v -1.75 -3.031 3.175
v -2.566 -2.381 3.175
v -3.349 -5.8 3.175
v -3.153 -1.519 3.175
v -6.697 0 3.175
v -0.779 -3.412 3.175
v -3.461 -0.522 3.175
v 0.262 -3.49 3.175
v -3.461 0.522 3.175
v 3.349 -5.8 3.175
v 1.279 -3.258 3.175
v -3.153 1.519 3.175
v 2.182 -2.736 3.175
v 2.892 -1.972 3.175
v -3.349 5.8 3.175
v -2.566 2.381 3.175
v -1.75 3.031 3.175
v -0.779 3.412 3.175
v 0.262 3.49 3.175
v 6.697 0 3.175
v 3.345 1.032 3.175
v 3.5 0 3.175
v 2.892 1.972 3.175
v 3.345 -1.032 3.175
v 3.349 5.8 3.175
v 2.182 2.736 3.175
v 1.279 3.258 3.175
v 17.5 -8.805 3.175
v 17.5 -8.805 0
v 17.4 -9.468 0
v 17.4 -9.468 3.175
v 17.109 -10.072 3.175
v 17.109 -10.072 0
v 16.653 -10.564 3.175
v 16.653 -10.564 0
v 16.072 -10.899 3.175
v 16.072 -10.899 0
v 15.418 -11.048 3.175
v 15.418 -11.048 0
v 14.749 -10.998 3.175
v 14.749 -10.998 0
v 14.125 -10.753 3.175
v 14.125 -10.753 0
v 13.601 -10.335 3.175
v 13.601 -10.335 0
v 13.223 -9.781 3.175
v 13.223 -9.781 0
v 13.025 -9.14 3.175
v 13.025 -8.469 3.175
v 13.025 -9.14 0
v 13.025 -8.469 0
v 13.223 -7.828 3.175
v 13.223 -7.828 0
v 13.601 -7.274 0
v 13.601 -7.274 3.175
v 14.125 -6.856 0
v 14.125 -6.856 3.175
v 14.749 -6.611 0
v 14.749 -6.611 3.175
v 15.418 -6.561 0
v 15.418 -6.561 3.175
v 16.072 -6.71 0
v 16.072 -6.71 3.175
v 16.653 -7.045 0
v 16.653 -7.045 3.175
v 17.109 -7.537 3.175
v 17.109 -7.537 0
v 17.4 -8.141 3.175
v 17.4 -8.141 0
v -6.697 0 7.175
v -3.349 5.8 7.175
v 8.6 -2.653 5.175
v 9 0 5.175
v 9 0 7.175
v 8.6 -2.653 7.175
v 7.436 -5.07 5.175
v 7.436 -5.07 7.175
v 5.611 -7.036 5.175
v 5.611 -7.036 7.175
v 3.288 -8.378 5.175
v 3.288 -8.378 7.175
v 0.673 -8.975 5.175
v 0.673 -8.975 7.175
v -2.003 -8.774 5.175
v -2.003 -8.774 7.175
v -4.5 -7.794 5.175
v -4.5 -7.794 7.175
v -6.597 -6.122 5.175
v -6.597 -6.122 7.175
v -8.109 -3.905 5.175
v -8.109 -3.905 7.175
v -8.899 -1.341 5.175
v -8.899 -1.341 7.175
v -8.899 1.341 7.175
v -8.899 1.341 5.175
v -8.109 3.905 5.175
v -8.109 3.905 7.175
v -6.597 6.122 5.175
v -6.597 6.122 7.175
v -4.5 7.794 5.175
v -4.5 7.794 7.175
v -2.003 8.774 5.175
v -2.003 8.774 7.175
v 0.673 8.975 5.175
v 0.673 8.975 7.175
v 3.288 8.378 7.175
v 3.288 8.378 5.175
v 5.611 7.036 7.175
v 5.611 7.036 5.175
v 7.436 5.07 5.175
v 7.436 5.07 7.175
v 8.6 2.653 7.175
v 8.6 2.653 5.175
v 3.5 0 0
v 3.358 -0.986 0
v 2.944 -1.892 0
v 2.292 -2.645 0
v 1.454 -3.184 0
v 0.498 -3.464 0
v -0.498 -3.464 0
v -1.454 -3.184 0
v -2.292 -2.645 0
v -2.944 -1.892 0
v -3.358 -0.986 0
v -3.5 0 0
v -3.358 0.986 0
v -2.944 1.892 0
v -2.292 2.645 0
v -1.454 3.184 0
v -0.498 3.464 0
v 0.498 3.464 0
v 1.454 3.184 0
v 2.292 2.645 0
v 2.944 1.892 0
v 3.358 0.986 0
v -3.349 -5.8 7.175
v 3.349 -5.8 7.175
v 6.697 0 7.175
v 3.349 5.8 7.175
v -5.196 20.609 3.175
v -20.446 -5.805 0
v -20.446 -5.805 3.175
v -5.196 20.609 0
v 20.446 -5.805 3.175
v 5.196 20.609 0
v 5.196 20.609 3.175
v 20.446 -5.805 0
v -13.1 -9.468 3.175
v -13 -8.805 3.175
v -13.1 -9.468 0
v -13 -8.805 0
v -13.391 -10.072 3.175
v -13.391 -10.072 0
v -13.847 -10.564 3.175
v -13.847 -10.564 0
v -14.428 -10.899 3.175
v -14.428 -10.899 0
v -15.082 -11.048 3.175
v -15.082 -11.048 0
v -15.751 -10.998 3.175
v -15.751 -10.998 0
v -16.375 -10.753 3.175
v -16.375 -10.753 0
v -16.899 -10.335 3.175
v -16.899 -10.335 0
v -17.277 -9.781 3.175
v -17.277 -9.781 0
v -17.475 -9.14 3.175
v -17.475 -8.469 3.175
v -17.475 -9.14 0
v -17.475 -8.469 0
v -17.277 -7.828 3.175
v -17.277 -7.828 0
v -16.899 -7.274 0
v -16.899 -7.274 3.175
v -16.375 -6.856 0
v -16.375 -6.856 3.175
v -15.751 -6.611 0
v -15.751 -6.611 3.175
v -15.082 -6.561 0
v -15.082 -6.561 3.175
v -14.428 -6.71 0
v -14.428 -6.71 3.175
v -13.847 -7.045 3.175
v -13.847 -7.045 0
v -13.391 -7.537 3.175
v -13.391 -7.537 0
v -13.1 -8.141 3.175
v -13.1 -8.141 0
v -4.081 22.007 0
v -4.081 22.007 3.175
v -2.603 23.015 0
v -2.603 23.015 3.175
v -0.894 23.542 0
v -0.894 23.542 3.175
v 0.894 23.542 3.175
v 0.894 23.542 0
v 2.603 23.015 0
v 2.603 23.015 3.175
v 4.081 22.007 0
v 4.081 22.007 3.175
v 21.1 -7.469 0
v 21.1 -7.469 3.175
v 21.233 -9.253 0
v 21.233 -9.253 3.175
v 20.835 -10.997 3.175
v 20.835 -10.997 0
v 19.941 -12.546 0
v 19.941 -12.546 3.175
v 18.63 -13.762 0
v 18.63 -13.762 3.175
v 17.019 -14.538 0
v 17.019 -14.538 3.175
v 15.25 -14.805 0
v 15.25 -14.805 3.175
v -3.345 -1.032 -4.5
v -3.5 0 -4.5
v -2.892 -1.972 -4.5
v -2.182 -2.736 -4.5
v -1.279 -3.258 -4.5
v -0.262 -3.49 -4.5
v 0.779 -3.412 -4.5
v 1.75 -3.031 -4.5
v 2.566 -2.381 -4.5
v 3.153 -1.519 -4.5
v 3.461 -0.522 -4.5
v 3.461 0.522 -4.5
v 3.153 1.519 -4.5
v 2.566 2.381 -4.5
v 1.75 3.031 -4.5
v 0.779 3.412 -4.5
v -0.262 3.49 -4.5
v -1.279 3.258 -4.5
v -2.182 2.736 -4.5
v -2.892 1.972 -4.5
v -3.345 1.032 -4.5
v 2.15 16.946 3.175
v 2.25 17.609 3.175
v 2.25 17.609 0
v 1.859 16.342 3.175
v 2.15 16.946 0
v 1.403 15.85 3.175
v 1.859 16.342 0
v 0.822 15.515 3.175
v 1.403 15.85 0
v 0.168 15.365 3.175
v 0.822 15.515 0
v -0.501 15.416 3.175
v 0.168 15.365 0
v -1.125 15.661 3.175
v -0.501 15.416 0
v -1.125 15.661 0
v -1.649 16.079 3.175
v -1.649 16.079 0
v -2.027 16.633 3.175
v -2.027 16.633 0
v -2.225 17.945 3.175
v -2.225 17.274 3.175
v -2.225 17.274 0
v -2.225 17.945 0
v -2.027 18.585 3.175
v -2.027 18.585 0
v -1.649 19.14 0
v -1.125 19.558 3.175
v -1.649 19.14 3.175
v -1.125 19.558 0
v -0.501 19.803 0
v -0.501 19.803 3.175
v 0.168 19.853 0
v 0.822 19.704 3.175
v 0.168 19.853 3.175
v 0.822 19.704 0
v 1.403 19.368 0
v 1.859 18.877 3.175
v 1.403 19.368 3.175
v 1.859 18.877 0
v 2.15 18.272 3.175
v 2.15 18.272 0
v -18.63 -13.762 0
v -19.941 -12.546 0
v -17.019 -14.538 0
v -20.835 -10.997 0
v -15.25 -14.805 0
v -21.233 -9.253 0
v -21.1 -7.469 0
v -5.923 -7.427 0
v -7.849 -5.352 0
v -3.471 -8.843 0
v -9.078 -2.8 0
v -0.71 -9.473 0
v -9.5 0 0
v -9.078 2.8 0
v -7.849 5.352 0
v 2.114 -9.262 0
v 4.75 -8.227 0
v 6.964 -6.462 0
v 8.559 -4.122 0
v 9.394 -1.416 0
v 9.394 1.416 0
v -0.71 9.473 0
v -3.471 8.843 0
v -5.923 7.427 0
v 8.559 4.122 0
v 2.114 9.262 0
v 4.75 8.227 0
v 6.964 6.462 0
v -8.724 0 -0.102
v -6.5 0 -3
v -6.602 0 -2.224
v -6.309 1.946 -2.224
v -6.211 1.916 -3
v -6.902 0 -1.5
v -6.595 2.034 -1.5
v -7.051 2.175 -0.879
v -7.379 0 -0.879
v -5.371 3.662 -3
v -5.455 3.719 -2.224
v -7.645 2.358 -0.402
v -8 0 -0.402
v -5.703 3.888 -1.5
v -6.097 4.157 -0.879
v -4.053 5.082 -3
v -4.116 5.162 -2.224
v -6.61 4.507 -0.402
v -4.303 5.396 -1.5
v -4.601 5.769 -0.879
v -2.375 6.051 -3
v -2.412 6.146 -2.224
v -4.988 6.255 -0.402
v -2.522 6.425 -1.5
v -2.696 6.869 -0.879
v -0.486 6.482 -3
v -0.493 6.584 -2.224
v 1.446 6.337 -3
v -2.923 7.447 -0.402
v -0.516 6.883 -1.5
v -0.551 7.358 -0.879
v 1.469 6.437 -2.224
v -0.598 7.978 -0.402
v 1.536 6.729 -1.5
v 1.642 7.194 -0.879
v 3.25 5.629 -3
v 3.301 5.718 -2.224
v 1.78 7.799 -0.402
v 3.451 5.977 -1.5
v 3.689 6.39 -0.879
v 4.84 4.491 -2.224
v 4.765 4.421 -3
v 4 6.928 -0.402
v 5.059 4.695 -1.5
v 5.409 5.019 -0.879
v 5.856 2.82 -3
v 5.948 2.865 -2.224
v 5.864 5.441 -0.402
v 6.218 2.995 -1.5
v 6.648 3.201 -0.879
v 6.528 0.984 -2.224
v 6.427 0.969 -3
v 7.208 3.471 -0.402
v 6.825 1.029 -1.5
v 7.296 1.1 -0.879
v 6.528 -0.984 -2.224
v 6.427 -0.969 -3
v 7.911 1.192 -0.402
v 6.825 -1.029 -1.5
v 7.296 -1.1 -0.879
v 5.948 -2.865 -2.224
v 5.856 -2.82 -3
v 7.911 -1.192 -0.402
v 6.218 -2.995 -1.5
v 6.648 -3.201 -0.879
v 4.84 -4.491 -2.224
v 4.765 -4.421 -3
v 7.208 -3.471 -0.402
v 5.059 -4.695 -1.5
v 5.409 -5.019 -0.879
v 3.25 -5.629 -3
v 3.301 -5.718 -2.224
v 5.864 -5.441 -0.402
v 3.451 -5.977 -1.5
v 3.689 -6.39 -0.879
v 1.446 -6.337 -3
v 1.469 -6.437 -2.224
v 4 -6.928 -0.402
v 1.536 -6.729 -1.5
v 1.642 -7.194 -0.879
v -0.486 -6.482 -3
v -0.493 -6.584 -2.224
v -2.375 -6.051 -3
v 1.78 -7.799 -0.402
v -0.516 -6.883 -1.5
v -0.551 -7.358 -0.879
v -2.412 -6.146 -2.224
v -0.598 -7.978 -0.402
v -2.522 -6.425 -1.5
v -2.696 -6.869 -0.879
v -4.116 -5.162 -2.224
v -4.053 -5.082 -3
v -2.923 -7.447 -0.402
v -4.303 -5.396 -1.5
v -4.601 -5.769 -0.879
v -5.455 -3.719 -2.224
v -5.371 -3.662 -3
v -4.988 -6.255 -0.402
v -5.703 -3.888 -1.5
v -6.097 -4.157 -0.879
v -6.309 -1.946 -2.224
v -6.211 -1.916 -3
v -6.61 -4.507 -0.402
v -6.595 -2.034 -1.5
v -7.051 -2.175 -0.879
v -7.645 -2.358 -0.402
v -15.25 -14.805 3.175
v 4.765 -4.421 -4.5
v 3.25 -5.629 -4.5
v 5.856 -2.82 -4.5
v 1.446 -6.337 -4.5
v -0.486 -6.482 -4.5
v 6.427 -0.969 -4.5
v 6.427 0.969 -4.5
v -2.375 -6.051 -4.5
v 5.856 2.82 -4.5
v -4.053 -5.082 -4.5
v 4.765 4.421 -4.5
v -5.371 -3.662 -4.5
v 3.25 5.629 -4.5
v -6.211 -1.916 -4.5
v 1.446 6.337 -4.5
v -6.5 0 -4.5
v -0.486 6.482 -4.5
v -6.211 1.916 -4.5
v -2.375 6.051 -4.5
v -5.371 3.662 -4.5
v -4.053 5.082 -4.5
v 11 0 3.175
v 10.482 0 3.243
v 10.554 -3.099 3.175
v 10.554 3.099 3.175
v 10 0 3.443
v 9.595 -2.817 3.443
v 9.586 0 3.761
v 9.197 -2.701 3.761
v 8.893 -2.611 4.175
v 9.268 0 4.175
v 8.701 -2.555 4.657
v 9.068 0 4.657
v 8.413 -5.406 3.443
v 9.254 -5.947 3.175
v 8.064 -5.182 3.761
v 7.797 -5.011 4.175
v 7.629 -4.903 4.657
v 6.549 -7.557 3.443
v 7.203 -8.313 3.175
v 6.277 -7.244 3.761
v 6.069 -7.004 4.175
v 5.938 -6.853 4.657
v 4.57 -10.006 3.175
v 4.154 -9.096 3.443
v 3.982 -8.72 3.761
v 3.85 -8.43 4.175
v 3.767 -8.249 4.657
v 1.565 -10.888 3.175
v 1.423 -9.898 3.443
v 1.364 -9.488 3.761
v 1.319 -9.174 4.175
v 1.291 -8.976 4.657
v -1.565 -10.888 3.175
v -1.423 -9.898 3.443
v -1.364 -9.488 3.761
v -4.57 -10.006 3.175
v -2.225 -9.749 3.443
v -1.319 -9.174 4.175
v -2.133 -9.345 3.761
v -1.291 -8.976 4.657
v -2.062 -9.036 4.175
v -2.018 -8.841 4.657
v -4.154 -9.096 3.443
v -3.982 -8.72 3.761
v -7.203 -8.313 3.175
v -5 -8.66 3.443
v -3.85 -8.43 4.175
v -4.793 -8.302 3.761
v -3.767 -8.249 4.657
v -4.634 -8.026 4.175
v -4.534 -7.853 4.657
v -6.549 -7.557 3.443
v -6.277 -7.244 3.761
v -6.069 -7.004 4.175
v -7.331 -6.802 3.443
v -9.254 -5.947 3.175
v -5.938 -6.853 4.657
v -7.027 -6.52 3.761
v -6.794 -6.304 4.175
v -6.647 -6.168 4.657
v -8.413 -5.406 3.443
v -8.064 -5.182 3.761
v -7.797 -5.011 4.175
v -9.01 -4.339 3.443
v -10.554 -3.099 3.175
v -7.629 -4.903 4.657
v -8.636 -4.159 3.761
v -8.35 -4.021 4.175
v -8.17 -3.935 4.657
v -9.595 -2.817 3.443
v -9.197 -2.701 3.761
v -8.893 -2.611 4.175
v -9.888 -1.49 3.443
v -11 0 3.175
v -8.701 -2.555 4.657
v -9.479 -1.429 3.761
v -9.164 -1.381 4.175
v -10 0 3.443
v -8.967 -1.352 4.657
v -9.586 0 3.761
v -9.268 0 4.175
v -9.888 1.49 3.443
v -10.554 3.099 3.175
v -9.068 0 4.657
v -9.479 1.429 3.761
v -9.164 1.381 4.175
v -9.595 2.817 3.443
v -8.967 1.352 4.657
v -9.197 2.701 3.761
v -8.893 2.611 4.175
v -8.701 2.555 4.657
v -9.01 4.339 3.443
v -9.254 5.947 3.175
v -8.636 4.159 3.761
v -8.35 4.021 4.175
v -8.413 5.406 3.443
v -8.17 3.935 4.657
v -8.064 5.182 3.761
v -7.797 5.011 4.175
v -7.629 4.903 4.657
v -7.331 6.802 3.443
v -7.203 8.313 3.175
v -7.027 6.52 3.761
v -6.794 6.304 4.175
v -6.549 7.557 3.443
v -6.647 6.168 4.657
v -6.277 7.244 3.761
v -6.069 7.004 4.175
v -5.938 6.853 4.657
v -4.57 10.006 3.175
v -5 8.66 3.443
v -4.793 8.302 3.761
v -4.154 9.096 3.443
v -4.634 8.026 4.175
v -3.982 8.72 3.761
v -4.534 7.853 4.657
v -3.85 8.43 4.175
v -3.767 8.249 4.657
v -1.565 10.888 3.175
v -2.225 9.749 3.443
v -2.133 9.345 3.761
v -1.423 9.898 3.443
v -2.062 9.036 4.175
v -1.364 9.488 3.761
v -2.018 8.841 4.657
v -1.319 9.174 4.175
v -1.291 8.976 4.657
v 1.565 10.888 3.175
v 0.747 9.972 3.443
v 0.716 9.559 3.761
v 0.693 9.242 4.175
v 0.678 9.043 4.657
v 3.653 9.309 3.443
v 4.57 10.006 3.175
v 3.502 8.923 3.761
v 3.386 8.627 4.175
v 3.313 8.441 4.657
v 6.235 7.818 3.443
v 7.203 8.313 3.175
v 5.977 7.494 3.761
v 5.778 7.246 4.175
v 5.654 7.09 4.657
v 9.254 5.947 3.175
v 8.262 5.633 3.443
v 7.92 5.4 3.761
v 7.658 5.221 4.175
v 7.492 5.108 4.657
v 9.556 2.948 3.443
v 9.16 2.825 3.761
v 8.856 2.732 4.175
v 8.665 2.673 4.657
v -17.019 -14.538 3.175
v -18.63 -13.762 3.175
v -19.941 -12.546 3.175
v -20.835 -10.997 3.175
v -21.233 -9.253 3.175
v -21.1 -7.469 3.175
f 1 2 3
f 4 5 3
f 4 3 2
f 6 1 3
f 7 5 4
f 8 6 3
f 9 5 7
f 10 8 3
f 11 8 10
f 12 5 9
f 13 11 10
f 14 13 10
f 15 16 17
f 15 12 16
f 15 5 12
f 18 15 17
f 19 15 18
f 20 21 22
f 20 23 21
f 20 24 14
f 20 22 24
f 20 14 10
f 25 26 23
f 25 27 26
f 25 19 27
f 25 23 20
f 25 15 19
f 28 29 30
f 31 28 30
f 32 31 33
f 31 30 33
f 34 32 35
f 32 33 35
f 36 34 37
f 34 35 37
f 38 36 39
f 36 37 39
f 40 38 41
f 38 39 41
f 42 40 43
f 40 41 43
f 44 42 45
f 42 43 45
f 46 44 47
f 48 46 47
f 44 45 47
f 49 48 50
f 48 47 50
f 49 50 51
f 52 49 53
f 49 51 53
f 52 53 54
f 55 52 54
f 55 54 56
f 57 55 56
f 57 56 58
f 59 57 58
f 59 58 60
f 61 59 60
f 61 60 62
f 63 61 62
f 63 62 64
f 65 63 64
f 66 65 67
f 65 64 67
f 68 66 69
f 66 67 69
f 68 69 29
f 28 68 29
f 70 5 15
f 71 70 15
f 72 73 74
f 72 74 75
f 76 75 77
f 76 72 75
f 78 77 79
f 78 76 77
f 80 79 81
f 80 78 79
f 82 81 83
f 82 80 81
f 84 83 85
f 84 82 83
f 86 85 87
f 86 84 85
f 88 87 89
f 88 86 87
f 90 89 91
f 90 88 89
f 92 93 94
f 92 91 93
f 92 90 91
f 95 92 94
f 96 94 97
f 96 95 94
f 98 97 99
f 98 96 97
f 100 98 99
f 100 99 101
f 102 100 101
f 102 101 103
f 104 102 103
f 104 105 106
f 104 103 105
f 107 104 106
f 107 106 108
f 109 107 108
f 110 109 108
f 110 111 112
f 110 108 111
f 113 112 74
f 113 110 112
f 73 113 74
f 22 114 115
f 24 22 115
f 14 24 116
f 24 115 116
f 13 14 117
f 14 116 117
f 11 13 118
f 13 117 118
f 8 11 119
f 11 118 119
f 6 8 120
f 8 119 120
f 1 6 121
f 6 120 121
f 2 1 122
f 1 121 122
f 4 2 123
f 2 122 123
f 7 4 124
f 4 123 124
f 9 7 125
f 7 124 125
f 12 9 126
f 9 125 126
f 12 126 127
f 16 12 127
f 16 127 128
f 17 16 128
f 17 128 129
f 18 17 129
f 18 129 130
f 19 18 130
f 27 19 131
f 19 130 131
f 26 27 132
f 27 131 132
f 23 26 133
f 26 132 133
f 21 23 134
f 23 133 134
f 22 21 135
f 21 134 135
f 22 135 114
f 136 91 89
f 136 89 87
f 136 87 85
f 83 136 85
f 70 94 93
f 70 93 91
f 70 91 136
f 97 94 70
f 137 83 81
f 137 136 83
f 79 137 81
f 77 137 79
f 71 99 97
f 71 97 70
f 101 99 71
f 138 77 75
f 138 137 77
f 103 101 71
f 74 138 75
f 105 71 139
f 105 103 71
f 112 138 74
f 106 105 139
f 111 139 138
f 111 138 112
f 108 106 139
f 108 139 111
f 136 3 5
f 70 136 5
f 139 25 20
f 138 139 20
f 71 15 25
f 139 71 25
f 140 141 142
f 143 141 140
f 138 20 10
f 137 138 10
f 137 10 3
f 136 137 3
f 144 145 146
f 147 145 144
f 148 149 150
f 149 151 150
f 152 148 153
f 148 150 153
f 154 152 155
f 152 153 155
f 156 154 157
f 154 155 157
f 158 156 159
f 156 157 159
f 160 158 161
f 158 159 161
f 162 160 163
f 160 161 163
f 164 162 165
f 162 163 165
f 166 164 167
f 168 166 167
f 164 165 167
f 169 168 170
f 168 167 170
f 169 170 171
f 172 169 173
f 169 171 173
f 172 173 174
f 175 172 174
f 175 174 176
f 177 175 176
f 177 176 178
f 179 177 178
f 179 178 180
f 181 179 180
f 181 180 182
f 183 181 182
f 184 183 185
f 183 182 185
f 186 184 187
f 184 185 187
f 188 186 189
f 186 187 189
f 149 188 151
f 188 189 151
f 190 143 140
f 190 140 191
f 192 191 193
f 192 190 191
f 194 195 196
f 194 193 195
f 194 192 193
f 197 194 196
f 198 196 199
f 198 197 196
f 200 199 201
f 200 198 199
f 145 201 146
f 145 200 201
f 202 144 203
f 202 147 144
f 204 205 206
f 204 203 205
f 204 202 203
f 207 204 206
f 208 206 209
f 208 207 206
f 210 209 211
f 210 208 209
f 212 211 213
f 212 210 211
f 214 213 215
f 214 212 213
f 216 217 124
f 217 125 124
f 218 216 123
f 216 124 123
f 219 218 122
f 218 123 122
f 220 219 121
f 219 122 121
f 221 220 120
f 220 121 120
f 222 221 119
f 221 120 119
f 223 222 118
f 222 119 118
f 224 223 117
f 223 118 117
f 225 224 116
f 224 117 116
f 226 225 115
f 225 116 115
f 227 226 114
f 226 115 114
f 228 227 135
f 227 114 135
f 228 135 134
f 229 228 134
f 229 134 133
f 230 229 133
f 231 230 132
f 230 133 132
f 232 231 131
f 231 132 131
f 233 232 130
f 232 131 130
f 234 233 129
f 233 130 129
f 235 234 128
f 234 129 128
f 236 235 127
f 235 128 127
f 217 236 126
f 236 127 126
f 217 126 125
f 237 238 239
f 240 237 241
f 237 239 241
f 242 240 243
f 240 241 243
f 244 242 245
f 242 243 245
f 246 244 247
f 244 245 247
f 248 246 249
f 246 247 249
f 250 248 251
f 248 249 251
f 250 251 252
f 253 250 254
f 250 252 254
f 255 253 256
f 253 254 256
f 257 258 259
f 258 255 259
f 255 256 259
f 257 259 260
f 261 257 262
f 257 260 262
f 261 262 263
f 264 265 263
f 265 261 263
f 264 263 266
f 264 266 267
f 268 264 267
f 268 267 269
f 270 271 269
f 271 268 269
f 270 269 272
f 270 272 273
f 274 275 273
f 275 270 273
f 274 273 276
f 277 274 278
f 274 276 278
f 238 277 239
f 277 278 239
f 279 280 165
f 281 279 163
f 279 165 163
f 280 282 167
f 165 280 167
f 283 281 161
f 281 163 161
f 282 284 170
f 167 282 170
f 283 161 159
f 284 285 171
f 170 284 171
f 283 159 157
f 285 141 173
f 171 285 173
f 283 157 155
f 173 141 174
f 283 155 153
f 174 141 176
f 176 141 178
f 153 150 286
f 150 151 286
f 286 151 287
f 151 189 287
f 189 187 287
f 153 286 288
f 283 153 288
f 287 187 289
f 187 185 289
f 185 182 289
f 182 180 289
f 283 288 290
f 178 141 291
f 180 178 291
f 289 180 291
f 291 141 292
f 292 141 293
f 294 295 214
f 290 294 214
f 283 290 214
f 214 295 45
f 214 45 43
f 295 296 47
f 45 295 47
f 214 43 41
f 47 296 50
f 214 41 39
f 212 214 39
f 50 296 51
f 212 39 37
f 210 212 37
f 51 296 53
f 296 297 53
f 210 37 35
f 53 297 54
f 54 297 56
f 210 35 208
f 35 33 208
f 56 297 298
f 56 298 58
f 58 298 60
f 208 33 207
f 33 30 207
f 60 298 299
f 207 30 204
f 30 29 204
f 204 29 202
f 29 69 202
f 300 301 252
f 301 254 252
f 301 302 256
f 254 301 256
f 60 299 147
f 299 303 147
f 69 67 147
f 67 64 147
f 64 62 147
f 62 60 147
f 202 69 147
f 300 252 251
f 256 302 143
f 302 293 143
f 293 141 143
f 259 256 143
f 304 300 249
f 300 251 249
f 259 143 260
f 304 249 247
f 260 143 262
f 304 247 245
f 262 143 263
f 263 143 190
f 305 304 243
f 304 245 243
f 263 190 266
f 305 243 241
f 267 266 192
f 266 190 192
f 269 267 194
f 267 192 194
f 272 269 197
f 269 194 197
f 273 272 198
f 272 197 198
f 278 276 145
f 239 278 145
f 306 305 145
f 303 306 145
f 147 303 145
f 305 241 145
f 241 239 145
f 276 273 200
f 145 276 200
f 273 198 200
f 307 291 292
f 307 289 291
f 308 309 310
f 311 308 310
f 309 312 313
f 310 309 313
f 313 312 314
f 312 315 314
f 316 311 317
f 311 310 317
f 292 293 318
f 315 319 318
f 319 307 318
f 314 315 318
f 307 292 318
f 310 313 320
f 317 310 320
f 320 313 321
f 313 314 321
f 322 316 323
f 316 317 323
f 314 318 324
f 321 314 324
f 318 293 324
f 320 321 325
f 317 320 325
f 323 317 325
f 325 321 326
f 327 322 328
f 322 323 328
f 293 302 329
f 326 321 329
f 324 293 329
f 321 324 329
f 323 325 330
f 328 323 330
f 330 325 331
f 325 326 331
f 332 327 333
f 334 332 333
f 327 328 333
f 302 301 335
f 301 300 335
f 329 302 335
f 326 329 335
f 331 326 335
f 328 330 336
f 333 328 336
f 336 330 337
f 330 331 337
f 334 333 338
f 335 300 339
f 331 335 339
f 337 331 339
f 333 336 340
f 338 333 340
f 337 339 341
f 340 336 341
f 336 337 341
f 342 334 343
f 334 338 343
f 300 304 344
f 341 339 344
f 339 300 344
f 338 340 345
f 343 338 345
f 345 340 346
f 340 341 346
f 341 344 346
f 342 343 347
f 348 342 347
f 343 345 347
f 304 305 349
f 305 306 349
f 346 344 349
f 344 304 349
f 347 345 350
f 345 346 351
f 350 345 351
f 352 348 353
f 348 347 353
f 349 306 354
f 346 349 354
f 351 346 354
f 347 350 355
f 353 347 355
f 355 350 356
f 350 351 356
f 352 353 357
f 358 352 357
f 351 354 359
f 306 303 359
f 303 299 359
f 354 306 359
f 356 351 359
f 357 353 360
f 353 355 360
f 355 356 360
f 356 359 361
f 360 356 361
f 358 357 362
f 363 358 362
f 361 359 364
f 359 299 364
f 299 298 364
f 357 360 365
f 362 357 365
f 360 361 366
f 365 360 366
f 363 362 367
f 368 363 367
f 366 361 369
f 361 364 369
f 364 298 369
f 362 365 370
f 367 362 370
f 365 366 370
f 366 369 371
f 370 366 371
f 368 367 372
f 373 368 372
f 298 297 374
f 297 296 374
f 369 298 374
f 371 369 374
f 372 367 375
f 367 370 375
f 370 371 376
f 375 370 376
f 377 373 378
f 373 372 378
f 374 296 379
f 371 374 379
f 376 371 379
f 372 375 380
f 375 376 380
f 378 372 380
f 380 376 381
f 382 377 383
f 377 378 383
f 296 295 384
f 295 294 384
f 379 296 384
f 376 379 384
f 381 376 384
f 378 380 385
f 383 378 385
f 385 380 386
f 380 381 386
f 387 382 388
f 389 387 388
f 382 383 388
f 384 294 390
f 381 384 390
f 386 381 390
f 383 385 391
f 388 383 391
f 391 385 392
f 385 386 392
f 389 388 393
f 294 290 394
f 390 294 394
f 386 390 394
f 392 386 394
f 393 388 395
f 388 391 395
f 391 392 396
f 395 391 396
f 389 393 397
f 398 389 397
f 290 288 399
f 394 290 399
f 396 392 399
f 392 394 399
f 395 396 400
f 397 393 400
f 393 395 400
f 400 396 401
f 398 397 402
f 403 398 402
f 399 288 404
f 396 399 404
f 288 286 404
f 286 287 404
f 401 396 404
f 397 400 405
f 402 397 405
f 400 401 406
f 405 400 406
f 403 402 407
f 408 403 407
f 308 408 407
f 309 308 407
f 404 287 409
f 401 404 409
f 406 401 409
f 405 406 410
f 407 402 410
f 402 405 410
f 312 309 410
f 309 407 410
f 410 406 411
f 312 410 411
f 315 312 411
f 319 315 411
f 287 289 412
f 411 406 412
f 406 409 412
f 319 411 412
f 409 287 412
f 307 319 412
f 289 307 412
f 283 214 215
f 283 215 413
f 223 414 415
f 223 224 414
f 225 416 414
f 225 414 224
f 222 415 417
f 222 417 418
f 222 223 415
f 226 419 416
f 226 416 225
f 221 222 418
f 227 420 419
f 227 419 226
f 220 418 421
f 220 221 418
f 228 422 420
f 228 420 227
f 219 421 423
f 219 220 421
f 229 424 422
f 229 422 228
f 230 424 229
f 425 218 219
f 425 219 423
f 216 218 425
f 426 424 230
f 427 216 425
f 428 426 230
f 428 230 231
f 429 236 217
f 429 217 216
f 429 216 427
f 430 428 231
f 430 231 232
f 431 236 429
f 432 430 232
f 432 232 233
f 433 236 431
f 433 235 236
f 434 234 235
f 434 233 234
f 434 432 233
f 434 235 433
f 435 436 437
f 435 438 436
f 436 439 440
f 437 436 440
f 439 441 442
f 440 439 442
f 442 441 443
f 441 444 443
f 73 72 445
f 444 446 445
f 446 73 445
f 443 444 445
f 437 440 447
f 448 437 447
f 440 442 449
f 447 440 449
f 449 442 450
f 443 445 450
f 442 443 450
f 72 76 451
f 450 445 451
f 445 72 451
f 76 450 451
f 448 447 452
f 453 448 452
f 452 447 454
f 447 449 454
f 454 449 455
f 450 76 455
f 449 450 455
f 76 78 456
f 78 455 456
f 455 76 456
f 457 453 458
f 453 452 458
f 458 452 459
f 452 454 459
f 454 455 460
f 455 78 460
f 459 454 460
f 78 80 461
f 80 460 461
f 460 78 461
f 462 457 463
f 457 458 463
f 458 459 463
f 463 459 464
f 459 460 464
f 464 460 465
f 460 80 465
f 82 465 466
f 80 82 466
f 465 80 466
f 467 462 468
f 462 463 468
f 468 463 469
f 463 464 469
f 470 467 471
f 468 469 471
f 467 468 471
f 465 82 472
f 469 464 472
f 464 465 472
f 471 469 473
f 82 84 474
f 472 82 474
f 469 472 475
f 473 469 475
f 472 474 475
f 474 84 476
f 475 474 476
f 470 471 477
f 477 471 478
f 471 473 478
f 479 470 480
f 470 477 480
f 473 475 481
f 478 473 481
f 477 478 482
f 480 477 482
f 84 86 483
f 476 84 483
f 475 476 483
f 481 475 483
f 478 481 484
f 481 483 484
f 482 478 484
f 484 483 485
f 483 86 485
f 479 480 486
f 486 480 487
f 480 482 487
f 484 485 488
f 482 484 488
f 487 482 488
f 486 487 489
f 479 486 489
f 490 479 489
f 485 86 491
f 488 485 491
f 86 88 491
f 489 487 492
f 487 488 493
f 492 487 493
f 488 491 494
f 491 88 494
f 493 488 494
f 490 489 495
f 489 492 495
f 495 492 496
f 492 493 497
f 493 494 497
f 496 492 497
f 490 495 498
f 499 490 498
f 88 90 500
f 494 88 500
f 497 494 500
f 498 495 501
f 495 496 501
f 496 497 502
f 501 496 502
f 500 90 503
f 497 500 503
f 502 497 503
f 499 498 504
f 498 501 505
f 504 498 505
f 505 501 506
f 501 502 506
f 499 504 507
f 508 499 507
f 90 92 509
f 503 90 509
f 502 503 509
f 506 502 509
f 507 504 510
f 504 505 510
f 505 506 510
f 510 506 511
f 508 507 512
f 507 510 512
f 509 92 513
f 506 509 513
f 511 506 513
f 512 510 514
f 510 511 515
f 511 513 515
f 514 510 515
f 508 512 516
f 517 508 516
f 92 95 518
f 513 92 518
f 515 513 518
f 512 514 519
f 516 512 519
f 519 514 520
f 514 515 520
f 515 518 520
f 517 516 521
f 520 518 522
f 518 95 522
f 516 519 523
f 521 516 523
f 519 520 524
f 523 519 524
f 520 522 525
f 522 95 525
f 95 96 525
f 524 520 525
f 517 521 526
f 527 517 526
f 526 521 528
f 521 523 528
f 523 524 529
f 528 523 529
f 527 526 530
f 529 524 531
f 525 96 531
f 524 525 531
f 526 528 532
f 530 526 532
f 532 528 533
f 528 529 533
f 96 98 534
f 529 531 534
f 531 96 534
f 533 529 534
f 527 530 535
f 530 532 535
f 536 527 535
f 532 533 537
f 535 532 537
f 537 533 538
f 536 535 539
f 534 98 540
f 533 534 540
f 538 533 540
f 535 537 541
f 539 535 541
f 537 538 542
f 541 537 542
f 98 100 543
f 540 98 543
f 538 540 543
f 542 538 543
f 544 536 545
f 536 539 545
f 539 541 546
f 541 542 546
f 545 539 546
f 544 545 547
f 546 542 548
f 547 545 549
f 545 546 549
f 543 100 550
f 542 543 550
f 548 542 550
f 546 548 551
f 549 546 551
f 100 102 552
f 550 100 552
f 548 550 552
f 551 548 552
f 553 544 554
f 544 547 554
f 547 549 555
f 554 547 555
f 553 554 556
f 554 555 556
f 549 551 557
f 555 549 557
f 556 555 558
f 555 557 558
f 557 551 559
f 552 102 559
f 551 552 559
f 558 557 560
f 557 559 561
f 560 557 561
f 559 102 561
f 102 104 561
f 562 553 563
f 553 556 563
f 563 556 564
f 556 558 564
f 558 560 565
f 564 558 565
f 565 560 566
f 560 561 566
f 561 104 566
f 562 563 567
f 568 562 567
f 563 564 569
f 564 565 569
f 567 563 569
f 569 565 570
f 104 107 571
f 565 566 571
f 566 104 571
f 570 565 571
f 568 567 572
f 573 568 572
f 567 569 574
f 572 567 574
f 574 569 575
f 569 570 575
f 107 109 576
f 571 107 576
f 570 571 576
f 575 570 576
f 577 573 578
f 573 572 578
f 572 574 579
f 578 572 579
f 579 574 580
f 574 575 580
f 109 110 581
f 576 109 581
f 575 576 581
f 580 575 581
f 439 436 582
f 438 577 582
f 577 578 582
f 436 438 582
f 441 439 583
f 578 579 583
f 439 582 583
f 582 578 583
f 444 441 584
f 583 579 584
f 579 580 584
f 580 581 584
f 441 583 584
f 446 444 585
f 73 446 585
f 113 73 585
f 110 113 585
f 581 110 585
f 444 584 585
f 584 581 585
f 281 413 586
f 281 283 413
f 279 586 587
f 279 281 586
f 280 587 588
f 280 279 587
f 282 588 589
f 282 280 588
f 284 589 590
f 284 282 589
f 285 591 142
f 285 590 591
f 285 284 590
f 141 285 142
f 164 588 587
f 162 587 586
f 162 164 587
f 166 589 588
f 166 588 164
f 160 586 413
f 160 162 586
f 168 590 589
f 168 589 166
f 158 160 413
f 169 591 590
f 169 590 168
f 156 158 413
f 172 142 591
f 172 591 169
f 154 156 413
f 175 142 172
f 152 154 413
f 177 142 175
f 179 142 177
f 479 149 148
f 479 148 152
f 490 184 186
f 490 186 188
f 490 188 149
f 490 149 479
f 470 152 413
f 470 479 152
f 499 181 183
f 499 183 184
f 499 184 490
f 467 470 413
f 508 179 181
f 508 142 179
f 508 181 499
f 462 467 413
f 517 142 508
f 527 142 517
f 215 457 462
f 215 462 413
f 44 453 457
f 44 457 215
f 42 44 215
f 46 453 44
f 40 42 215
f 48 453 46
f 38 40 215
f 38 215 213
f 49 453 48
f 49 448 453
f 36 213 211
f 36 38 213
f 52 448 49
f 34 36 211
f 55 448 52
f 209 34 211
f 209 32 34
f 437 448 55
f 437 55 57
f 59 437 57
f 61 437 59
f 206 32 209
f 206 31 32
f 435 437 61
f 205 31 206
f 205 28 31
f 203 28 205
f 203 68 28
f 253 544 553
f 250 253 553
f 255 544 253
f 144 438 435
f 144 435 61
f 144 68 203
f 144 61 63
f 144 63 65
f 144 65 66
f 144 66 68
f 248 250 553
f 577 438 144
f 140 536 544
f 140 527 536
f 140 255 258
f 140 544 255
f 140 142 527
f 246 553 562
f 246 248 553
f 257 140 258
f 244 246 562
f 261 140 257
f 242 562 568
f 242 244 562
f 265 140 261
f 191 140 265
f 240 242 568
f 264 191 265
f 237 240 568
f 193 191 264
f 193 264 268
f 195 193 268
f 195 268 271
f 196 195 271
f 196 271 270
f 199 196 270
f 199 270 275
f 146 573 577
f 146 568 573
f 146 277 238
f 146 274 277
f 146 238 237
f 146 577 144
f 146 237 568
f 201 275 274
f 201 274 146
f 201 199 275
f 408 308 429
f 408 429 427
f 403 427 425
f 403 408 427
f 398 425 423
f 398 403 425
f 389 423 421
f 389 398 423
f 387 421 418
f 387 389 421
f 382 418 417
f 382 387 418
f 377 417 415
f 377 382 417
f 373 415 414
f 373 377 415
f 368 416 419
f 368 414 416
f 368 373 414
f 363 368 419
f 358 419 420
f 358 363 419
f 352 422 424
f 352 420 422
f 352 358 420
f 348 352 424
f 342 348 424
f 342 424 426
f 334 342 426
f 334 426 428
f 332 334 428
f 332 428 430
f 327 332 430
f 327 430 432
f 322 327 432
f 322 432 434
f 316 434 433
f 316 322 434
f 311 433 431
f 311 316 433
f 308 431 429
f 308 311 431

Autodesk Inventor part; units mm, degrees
ref_plane "YZ Plane" through (0, 0, 0) normal (1, 0, 0) x (0, 1, 0)
ref_plane "XZ Plane" through (0, 0, 0) normal (0, 1, 0) x (-1, 0, 0)
ref_plane "XY Plane" through (0, 0, 0) normal (0, 0, 1) x (1, 0, 0)
sketch "Sketch1" plane through (0, 0, 0) normal (0, 0, 1) x (1, 0, 0)
  line L0 (0, 17.6092) -> (15.25, -8.8046)
  line L1 (15.25, -8.8046) -> (-15.25, -8.8046)
  line L2 (-15.25, -8.8046) -> (0, 17.6092)
  circle A0 centre (-15.25, -8.8046) radius 2.25
  circle A1 centre (15.25, -8.8046) radius 2.25
  circle A2 centre (0, 17.6092) radius 2.25
  circle A3 centre (0, 0) radius 3.5
  circle A4 centre (-15.25, -8.8046) radius 6
  circle A5 centre (15.25, -8.8046) radius 6
  circle A6 centre (0, 17.6092) radius 6
  line L3 (5.1962, 20.6092) -> (20.4462, -5.8046)
  line L4 (15.25, -14.8046) -> (-15.25, -14.8046)
  line L5 (-20.4462, -5.8046) -> (-5.1962, 20.6092)
  dimension "d7" = 30.5
  dimension "d8" = 4.5
  dimension "d11" = 360
  dimension "d13" = 7
  dimension "d14" = 12
  dimension "d17" = 360
  dimension "d19" = 6
extrude "Extrusion1" add sketch "Sketch1" along normal blind 3.175 contours A2 L2 A6 L0 | L0 A6 L2 A2 | A6 L3 A5 L0 | L0 A5 L1 A4 L2 A6 | L2 A4 L5 A6 | A5 L1 A1 L0 | L0 A1 L1 A5 | A4 L1 A0 L2 | L2 A0 L1 A4 | A5 L4 A4 L1
sketch "Sketch2" plane through (0, 0, 0) normal (0, 0, -1) x (-1, 0, 0)
  circle A0 centre (0, 0) radius 3.5 projected
  circle A1 centre (0, 0) radius 6.5
  circle A2 centre (0, 0) radius 3.5
  dimension "d22" = 13
extrude "Extrusion2" add sketch "Sketch2" along normal blind 4.5
fillet "Fillet1" radius 3 1 edges at (6.5, 0, 0)
sketch "Sketch3" plane through (0, 0, 3.175) normal (0, 0, 1) x (1, 0, 0)
  circle A0 centre (0, 0) radius 3.5 projected
  line L0 (6.6973, 0) -> (3.3486, -5.8)
  line L1 (3.3486, -5.8) -> (-3.3486, -5.8)
  line L2 (-3.3486, -5.8) -> (-6.6973, 0)
  line L3 (-6.6973, 0) -> (-3.3486, 5.8)
  line L4 (-3.3486, 5.8) -> (3.3486, 5.8)
  line L5 (3.3486, 5.8) -> (6.6973, 0)
  circle A1 centre (0, 0) radius 9
  dimension "d26" = 11.6
  dimension "d27" = 18
extrude "Extrusion3" add sketch "Sketch3" along normal blind 4 contours A1
fillet "Fillet2" radius 2 1 edges at (-9, 0, 3.175)
properties part number "triangle_1"
